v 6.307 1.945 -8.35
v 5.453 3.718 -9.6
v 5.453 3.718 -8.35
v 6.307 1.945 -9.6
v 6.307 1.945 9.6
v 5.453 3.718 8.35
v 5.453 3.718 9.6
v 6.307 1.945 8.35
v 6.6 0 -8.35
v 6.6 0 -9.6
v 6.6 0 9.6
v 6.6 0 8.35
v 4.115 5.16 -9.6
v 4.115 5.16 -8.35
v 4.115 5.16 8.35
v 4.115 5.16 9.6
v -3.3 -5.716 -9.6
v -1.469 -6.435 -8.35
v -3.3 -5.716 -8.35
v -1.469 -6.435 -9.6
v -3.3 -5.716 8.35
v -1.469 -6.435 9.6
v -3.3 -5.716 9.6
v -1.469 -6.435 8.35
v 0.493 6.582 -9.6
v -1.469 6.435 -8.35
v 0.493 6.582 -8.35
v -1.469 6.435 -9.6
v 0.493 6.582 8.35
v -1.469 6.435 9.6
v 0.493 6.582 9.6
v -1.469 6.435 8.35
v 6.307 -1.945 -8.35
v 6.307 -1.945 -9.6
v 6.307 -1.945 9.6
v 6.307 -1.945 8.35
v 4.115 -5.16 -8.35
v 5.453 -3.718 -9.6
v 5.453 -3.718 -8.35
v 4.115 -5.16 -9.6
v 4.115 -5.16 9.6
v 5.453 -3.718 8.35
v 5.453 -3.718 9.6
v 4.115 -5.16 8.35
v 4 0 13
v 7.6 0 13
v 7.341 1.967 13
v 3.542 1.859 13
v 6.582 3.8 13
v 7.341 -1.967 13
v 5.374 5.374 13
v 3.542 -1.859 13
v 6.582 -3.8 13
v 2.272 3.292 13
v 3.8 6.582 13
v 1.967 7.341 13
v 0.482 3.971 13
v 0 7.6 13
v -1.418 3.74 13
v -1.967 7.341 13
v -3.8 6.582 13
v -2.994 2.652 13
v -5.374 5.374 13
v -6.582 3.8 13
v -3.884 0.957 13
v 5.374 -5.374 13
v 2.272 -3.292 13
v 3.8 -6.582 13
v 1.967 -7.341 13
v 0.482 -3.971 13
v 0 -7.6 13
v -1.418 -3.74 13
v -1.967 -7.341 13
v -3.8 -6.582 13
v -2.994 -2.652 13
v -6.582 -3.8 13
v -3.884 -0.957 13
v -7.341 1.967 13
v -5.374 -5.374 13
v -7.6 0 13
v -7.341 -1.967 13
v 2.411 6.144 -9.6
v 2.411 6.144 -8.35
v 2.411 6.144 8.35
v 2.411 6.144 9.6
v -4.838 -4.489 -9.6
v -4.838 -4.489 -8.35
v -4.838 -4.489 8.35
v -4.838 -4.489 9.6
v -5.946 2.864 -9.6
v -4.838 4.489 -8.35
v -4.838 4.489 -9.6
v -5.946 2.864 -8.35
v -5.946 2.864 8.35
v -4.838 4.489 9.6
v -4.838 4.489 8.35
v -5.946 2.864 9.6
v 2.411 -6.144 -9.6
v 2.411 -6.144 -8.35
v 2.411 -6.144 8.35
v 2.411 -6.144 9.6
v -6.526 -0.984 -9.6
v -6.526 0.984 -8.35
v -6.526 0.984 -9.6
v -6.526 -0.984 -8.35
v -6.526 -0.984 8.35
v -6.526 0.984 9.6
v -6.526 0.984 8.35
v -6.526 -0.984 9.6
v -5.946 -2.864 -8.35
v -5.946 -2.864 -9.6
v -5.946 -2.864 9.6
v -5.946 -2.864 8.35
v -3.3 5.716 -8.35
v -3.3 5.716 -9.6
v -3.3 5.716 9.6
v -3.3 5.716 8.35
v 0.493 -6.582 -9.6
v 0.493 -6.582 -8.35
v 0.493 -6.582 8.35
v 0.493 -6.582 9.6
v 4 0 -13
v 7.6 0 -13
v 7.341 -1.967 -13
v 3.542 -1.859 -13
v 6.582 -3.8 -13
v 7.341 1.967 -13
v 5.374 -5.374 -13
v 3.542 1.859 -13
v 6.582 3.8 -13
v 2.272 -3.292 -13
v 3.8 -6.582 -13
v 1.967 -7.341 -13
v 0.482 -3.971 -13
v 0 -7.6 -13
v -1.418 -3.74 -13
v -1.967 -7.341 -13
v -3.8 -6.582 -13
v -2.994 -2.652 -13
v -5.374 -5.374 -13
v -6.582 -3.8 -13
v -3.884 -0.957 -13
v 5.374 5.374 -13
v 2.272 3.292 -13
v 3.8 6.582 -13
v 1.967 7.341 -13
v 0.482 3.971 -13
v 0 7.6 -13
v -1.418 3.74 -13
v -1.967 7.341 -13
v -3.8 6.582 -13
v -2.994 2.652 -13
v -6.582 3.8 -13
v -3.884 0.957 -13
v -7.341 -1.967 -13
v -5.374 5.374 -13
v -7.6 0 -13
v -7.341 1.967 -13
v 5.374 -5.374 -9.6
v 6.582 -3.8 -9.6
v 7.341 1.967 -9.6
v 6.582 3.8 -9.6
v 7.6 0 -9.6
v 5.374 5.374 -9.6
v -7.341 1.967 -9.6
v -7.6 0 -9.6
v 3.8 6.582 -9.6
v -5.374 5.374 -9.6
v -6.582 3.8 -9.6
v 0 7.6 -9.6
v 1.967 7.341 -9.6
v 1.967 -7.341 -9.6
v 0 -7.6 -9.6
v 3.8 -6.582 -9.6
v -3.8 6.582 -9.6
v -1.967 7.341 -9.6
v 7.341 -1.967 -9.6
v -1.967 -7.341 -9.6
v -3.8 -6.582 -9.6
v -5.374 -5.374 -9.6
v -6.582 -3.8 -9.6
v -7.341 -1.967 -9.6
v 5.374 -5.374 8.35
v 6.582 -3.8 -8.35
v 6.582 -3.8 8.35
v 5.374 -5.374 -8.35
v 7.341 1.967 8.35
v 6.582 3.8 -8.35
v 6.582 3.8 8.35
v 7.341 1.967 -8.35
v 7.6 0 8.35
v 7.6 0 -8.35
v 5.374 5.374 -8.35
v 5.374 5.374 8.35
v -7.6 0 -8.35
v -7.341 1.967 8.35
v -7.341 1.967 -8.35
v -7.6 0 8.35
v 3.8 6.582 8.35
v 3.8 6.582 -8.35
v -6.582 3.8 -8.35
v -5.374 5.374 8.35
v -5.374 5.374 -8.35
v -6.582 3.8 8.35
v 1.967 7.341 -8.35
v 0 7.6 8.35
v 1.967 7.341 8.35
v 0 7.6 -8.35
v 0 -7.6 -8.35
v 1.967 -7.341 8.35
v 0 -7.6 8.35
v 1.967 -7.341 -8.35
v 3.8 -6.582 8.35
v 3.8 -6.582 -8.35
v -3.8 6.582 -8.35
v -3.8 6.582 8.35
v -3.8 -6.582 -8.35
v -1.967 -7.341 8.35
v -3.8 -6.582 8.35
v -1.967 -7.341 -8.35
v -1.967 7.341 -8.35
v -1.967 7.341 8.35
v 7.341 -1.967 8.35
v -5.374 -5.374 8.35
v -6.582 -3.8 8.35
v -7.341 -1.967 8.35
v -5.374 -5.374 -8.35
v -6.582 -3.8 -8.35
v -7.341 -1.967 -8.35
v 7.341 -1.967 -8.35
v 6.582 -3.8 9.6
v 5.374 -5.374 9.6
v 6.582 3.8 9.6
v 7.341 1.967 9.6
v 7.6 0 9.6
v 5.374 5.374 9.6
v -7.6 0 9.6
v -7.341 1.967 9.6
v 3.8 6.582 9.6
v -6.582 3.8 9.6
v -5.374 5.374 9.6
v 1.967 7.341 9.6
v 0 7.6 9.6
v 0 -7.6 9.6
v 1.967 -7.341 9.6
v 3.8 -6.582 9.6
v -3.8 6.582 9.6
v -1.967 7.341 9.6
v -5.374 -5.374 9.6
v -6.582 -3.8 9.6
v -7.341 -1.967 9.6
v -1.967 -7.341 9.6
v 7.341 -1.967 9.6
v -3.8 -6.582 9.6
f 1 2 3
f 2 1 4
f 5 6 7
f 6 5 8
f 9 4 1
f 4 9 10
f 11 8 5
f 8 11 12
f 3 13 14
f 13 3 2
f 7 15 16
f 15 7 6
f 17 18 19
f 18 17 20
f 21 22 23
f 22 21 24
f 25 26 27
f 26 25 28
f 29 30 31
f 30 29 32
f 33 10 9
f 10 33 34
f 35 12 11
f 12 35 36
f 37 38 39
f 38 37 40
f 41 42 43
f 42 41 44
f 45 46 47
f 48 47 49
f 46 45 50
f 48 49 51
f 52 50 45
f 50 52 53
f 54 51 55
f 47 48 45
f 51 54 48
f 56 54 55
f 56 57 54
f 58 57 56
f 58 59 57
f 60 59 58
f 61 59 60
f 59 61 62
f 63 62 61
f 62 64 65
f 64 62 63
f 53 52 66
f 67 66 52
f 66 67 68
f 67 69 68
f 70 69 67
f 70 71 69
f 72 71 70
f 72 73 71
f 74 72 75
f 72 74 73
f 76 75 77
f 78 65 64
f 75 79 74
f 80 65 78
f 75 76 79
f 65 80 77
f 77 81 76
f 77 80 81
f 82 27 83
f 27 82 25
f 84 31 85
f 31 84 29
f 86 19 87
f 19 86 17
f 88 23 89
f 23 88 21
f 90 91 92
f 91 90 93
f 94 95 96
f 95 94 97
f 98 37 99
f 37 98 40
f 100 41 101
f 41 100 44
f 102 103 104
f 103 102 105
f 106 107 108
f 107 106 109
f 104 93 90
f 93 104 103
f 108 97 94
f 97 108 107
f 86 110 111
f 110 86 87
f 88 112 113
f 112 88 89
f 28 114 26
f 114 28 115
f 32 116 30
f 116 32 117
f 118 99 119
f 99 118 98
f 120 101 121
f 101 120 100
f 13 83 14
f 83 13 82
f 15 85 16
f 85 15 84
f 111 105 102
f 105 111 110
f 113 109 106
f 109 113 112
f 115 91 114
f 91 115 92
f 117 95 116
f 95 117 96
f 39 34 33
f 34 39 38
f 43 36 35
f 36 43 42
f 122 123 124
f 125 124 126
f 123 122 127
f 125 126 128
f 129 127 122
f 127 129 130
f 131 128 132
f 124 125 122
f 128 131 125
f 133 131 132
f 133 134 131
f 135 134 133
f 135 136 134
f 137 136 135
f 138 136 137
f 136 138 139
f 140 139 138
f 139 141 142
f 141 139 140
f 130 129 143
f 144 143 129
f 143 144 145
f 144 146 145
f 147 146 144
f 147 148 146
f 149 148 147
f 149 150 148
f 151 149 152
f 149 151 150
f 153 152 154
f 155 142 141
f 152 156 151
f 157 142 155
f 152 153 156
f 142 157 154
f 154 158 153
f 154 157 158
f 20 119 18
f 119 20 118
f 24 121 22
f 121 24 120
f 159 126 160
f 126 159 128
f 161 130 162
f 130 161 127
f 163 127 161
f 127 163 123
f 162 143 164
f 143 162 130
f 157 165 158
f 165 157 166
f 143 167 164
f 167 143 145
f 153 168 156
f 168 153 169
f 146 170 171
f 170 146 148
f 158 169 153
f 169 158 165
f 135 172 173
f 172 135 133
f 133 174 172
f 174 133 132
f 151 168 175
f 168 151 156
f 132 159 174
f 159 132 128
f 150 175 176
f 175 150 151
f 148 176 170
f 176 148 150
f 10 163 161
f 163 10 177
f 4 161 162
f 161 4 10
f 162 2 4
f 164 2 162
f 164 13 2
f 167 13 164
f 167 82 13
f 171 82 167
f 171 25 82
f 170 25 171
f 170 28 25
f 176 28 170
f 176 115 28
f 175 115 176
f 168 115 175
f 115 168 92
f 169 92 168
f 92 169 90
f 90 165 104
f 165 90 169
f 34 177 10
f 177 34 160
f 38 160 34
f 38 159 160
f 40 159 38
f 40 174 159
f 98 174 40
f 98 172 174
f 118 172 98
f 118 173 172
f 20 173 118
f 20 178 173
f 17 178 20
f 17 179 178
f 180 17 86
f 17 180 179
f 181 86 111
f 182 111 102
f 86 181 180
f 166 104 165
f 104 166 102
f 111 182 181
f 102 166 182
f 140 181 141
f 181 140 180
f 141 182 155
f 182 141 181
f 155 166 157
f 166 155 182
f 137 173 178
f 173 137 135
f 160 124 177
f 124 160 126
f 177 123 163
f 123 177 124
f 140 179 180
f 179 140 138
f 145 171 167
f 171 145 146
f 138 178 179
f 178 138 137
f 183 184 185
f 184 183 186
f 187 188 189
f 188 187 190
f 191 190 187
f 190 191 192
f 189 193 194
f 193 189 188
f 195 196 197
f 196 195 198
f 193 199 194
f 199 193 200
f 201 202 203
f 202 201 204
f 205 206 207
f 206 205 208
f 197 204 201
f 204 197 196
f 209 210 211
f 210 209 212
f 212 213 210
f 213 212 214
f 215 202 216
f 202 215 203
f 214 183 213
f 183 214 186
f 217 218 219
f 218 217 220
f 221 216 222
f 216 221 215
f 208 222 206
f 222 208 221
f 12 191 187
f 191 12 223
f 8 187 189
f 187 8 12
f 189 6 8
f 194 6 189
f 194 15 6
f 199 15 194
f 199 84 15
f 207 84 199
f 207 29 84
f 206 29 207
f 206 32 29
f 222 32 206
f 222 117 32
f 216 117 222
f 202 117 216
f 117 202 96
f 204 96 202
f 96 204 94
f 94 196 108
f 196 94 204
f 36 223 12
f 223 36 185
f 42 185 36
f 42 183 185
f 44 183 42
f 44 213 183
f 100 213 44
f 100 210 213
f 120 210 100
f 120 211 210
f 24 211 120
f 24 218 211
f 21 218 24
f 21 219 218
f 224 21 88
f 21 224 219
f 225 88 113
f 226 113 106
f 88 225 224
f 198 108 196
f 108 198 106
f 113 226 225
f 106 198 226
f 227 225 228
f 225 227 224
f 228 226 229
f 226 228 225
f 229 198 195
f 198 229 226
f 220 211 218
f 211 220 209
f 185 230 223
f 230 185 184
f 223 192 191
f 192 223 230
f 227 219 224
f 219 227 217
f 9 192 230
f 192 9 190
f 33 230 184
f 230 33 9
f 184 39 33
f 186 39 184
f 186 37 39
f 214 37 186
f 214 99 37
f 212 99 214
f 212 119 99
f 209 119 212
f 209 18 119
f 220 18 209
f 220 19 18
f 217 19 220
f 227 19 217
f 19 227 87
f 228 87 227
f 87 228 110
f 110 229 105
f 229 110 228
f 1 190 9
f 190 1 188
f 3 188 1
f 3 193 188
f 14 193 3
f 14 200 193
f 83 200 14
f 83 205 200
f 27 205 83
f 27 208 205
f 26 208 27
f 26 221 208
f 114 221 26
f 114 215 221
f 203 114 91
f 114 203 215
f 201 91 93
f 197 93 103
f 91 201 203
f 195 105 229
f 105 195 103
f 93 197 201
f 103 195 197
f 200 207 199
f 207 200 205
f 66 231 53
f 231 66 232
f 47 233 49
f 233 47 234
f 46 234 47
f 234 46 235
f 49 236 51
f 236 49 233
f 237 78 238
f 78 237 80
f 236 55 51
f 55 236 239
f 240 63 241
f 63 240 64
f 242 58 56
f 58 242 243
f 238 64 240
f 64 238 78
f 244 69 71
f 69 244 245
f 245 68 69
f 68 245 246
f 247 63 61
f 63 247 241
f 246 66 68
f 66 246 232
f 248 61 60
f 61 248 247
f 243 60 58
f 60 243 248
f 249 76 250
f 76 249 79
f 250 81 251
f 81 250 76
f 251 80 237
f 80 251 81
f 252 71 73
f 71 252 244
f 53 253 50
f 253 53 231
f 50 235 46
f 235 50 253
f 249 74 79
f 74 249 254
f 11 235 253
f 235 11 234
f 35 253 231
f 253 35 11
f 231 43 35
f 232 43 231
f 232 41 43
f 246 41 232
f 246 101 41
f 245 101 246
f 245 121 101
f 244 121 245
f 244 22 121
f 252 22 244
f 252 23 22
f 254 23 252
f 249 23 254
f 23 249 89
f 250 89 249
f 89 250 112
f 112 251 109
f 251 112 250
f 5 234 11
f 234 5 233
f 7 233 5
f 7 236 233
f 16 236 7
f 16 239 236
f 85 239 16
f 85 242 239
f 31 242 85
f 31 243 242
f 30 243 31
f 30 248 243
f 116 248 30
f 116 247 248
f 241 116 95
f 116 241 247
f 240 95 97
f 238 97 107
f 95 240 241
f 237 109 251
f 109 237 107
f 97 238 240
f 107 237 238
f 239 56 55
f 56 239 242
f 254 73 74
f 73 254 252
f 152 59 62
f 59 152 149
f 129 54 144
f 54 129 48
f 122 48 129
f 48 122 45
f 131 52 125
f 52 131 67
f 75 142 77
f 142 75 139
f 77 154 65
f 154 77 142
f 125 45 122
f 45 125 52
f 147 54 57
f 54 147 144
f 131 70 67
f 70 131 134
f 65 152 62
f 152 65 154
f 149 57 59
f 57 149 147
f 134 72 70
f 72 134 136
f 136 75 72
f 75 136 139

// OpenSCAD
// file: ../machine.scad
/*
 * Helpers for machinging; i.e. kerf alowances
 *
 * Copyright 2013 <b@Zi.iS>
 * License CC BY 3.0
 */

include <main.scad>;

ZCUT = 0;
XOFF = 0;
YOFF = 0;

module drawing() {
	//create blueprint
	if(preview==0) {
		projection(cut=true) translate([
			XOFF,
			YOFF,
			ZCUT
		]) {
			for(i=[0:$children-1]) child(i);
		}
	} else {
		for(i=[0:$children-1]) child(i);
	}
}

module kerf_cube(
	size
) {
	translate([
		kerf/2*(1-preview),
		kerf/2*(1-preview),
		0
	]) {
		cube([
			size[0] - kerf*(1-preview),
			size[1] - kerf*(1-preview),
			size[2]
		]);
	}
}

module kerf_cylinder(
	r,
	h
) {
	cylinder(
		r = r - kerf/2*(1-preview),
		h = h
	);
}

module part(
	id,
	name
) {
	if(PART<1 || PART==id) {
		echo(str("PART", id, ":", name));
		for(i=[0:$children-1]) child(i);
	}	
}
// file: ../easing.scad
/*
 * Make allowances to ensure good fit.
 *
 * Copyright 2013 <b@Zi.iS>
 * License CC BY 3.0
 */

function ease(value) = min(value*1.1, value + .2);
// file: ../epslion.scad
/*
 * Slightly offset previews to overcome rounding issues
 *
 * Copyright 2013 <b@Zi.iS>
 * License CC BY 3.0
 */

include <config.scad>;

module e(
	shift = -.1,
	size = 1.1
) {
	if(preview == 1) {
		translate([
			0,
			0,
			shift
		]) {
			scale([
				1,
				1,
				size
			]) {
				if($children>0) for (i = [0 : $children-1]) child(i);
			}
		}
	} else {
		if($children>0) for (i = [0 : $children-1]) child(i);
	}
}
// file: ../config.scad
/*
 * Default settings
 *
 * Copyright 2013 <b@Zi.iS>
 * License CC BY 3.0
 */

preview = 1;
$fa = 6;
$fs = 2 - 1.5*(1-preview);
kerf = .2;
PART = 0; //all

// preview colors
color_steel = [.8, .8, .8];
color_wood = [.3, .3, 0];
color_print = [0, .8, 0];
color_plastic = [.7, 1, .7];
// file: ../main.scad
/*
 * A library to make SCAD easier.
 *
 * Copyright 2013 <b@Zi.iS>
 * License CC BY 3.0
 */

include <config.scad>;
use <epslion.scad>;
use <easing.scad>;
use <machine.scad>;
// main file
/*
 * linear bearing
 *
 * Copyright 2013 <b@Zi.iS>
 * License CC BY 3.0
 */

include <../main.scad>;

lmXuu = [
	[],
	[],
	[],
	[],
	[],
	[],
	[],
	[],
	[
		15.2,	//outside
		8,		//inside
		26,		//length
	]
];

linear_bearing();

function linear_bearing_length(size) = lmXuu[size][2];
function linear_bearing_offset(size) = (lmXuu[size][0] - lmXuu[size][1]);

module linear_bearing(
	size = 8,
	id
) {
	part(id, str("Linear bearing lm", size, "uu")) color(color_steel) {
		translate([
			0,
			0,
			-lmXuu[size][2]/2
		]) {
			difference() {
				union() {
					cylinder(
						r = lmXuu[size][0]/2 - 1,
						h = lmXuu[size][2]
					);
					cylinder(
						r = lmXuu[size][0]/2,
						h = 3.4
					);
					translate([
						0,
						0,
						3.4 + 1.25
					]) {
						cylinder(
							r = lmXuu[size][0]/2,
							h = lmXuu[size][2] - (3.4 + 1.25) * 2
						);
					}
					translate([
						0,
						0,
						lmXuu[size][2] - 3.4
					]) {
						cylinder(
							r = lmXuu[size][0]/2,
							h = 3.4
						);
					}
				}
				e() cylinder(
					r = lmXuu[size][1]/2,
					h = lmXuu[size][2]
				);
			}
		}
	}
	translate([
		0,
		0,
		lmXuu[size][2]/2
	] * preview) {
		if($children>0) for (i = [0 : $children-1]) child(i);
	}
}
